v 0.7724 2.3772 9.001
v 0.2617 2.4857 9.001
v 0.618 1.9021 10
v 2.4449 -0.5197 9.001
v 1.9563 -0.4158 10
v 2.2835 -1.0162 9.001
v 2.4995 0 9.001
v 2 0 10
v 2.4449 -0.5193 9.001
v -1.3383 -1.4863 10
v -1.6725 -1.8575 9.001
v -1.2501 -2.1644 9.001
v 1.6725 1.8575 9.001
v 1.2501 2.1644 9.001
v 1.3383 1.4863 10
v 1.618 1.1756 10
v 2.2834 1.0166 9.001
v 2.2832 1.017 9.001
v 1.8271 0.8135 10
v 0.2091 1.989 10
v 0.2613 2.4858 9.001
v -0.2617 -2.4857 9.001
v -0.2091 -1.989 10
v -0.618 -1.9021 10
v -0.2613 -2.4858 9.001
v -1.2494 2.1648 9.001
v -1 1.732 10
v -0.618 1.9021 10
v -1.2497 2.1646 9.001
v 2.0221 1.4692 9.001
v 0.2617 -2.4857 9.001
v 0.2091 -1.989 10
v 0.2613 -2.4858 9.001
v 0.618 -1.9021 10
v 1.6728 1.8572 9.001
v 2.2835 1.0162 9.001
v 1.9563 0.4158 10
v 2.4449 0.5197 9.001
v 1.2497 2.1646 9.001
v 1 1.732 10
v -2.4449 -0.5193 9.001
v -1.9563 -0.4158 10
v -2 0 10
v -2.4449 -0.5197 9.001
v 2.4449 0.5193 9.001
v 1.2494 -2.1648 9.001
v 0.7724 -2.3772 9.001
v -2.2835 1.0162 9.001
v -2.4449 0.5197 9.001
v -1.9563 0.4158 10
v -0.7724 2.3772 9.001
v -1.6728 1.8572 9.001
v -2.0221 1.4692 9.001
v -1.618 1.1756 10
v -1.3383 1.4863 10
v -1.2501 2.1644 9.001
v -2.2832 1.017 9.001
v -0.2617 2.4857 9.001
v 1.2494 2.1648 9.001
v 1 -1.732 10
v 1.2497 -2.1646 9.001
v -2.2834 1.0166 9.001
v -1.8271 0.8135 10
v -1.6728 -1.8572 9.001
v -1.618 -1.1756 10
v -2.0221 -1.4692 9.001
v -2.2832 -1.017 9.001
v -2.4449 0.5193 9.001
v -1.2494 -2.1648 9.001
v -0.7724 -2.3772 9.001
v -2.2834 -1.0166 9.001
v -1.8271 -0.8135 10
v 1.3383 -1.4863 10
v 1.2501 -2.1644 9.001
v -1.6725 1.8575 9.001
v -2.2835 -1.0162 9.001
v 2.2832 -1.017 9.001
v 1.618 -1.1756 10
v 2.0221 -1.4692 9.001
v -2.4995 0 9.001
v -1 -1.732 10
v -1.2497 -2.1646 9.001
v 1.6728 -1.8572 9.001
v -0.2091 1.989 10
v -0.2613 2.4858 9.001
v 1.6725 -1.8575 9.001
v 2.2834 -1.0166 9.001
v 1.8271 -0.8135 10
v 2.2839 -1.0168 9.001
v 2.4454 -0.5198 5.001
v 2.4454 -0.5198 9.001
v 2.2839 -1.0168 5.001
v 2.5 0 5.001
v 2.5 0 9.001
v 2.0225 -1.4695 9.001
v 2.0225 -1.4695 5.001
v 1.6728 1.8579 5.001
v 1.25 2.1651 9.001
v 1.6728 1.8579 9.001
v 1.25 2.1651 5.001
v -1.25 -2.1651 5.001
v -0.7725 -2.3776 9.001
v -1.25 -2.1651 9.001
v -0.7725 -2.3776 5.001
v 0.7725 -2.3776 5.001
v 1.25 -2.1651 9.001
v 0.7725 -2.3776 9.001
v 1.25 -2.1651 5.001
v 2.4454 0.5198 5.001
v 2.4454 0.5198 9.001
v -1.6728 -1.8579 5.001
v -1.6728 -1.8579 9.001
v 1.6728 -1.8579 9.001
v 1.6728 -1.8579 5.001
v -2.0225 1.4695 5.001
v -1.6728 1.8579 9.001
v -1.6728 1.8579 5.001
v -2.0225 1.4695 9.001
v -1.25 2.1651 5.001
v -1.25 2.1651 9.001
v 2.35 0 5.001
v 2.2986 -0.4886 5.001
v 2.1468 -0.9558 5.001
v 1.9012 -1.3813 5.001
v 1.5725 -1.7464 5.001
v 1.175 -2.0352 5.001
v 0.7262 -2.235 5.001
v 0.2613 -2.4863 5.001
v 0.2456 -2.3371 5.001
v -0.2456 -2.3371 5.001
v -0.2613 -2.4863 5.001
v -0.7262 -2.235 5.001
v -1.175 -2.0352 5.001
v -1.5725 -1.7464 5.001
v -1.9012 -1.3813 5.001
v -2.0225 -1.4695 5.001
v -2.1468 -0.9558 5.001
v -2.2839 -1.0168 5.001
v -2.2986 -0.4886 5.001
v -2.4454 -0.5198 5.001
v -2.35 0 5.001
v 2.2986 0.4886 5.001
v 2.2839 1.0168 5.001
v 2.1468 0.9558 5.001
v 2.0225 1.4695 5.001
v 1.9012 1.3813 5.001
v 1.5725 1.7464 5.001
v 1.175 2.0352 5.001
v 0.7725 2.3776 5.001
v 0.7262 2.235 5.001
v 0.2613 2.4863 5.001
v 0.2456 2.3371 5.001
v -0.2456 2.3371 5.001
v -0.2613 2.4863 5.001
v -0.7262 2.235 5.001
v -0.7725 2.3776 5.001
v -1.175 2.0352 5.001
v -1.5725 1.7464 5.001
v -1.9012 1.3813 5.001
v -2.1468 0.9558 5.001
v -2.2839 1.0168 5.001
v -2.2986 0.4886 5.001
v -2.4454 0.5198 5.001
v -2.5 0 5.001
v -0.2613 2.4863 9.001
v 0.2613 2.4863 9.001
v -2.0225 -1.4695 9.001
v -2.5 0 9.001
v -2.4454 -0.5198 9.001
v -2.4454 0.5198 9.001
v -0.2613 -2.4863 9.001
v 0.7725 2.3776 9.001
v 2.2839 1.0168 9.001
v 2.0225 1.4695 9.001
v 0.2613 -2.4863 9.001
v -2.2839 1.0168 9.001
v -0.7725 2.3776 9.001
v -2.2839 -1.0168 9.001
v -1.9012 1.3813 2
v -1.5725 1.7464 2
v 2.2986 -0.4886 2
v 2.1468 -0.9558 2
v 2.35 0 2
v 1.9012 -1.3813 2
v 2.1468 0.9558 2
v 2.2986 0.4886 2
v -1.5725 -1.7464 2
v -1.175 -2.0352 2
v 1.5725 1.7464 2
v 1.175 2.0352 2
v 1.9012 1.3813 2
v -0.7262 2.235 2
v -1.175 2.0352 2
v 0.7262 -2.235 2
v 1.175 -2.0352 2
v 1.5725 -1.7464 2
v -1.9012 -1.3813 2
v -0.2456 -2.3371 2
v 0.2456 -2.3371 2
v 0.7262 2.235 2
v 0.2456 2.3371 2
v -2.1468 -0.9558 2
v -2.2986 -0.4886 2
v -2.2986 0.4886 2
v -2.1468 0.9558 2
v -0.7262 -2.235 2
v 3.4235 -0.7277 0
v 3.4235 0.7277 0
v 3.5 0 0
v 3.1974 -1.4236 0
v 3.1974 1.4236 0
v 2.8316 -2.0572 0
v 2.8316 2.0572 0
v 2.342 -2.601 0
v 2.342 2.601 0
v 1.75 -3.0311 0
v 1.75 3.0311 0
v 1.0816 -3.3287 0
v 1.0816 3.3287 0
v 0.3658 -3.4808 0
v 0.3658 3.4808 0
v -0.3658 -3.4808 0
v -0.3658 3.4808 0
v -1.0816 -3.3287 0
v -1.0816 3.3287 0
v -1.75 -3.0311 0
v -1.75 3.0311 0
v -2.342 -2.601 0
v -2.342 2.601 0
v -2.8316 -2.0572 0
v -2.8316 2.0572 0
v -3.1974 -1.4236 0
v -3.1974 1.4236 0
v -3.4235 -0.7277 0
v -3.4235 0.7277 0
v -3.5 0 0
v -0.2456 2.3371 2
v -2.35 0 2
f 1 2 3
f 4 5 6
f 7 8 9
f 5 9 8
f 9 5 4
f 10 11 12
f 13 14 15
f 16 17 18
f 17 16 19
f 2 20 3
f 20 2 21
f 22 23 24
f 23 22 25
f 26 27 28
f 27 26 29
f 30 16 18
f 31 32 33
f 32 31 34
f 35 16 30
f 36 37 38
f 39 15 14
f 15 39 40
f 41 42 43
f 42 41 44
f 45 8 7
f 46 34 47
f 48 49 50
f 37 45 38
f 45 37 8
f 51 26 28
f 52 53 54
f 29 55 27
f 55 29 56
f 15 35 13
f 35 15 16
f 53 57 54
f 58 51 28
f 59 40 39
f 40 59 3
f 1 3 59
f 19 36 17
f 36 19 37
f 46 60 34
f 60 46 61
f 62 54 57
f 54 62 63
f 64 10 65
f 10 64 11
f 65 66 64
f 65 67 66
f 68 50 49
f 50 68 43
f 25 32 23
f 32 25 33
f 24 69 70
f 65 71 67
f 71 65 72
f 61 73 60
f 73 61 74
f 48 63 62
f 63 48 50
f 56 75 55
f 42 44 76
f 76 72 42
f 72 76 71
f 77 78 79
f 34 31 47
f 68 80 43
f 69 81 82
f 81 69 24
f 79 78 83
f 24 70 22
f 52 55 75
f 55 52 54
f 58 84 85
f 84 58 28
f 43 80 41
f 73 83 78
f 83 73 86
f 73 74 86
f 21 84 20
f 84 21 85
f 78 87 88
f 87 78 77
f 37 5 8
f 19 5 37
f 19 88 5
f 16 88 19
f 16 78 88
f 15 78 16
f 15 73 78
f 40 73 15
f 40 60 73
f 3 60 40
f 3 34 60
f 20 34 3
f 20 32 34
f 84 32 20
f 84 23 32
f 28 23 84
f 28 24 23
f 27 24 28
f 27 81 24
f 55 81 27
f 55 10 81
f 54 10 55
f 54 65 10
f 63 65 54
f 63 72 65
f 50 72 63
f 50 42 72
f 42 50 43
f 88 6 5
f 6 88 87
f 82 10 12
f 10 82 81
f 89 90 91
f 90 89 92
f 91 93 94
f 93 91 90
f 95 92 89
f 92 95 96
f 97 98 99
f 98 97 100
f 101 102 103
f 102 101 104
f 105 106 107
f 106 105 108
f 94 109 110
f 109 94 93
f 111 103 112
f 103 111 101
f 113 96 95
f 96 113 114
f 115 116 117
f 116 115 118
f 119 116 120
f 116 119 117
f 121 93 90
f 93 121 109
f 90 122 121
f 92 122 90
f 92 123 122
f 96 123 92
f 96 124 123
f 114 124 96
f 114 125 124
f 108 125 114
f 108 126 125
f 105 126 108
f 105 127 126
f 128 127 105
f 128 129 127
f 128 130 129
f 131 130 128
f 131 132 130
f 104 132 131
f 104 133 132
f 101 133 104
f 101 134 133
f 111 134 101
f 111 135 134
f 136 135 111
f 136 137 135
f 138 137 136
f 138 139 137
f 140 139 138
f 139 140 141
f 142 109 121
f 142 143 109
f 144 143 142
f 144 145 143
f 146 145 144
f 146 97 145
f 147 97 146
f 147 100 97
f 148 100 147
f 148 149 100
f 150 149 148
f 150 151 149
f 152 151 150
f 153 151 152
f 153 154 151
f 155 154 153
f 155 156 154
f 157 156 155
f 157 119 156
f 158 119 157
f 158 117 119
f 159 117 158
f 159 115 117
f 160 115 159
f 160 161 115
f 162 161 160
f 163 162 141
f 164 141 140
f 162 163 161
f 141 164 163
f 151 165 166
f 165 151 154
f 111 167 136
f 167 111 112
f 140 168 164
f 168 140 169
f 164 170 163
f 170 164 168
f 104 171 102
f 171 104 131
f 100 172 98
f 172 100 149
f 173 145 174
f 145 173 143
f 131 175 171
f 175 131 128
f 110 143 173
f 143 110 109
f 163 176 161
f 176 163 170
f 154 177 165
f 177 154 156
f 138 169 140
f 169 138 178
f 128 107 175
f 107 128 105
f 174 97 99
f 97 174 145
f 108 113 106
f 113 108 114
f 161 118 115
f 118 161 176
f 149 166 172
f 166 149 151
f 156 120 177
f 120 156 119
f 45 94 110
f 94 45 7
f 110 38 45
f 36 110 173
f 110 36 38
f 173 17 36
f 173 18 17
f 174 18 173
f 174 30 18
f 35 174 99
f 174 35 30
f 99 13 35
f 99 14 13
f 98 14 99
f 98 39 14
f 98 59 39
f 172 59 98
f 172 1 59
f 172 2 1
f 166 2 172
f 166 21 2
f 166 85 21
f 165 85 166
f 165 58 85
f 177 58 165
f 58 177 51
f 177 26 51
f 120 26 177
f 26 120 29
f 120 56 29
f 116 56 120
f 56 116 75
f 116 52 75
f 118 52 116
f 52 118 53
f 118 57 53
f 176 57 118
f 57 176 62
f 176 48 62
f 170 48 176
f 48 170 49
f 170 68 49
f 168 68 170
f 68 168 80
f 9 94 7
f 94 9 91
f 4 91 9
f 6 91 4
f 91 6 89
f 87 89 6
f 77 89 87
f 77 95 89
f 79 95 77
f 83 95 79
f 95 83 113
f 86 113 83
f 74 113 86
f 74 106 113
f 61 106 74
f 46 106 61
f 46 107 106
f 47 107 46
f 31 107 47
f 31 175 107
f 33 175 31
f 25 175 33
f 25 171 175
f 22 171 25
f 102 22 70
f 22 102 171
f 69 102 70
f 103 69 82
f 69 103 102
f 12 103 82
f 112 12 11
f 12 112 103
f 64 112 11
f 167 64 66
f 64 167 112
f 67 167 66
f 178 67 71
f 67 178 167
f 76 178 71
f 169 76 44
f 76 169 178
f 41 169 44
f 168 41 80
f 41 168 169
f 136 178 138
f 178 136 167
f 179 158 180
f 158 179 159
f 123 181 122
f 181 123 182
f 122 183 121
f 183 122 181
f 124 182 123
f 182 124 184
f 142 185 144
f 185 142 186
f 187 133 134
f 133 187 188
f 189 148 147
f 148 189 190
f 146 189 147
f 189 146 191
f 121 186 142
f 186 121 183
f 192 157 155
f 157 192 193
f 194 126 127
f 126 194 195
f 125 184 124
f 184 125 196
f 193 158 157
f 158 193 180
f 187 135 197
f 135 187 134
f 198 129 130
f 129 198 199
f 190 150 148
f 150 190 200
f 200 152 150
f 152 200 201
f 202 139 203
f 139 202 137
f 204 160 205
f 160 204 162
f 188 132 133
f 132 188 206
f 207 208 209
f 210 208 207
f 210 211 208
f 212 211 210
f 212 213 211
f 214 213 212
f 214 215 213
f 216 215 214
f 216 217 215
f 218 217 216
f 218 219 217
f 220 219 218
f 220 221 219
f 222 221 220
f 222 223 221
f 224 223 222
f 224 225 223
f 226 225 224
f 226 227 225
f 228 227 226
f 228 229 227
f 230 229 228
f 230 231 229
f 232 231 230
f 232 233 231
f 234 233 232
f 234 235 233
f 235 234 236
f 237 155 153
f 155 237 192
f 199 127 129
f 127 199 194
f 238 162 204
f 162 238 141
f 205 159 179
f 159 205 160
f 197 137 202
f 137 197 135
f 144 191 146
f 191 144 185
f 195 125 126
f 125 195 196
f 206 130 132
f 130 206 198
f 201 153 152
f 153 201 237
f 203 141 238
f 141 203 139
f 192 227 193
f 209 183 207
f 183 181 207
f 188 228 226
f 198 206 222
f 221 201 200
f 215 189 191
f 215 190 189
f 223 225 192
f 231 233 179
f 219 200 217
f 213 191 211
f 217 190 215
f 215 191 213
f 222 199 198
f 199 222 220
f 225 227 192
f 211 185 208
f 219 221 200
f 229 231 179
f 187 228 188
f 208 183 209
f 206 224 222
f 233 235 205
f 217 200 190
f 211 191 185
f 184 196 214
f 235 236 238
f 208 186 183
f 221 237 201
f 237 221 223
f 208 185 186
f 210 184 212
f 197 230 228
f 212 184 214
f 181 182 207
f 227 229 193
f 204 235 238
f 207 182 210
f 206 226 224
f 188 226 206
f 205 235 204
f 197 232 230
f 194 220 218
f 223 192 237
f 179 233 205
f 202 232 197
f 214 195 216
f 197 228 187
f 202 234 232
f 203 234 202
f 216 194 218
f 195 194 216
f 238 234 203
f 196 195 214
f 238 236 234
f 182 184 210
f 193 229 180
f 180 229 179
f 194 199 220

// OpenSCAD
// create a pin to constrain the part
//should print sat on the wide end without difficulty
// should have a narrower "bearing surface" for the moveing part
//should end in a slightly wider profile to lock in
// use a wedge profile such that joint preload can be controlled by adjusting the insertion distance slightly

pinDia = 5;
pinClearence = 0.3;
//reduced tolerence for parts printed in ideal orientation
pinClearenceVert = 0.2;

$fs = 0.1;
$sa = 1;
//cone is part of the bearing
module pin(
matingLength = 5,
bearingLength = 5,
coneLength = 2,
coneOuterDia = 7,
pinDia = pinDia,
bearingDelta = pinClearence,
chamferLength = 1,
chamferStep = 1
){
assert(bearingLength>coneLength, "bearing length must be longer than cone length");
translate([0,0,-(matingLength+bearingLength)]) {
    //chamfer to make locating into hole easier
    cylinder(d1=pinDia-chamferStep,d2 = pinDia,h= chamferLength);
    //mating section is a fixed length plug
    translate([0,0,chamferLength-0.001]) cylinder(d=pinDia,h= matingLength-chamferLength);
    //bearing shaft is full length inside part
    translate([0,0,chamferLength]) cylinder(d=pinDia-bearingDelta,h= matingLength+bearingLength-chamferLength);
    //coneic mating surface
    translate([0,0,(matingLength+bearingLength)-coneLength]) cylinder(d1=pinDia-bearingDelta,d2 = coneOuterDia,h= coneLength);
    }
}

module pinClearence(
Length = 10,
pinDia = pinDia,
bearingDelta = pinClearence*1.5,
coneLength = 2,
coneOuterDia = 7,
overHead = 0.1
){
assert(Length>coneLength, "bearing length must be longer than cone length");
translate([0,0,-(Length)]) {
    //clear to the pin diamter throughout
    cylinder(d=pinDia+bearingDelta,h=Length);
    //coneic mating surface
    translate([0,0,(Length)-coneLength]) cylinder(d1=pinDia+bearingDelta,d2 = coneOuterDia,h= coneLength);
    translate([0,0,Length-0.01]) cylinder(d=coneOuterDia,h=overHead);
    }
}

module pinMate(Length = 10, pinClearence = pinClearence, overHead = 0.1){

    translate([0,0,-Length]) cylinder(d=pinDia+pinClearence,h=Length+overHead);

}
rotate([180,0,0]){
//translate([-10,0,0]) pinClearence();
translate([ 0,0,0]) pin();
//translate([ 10,0,0]) pinMate();
}
